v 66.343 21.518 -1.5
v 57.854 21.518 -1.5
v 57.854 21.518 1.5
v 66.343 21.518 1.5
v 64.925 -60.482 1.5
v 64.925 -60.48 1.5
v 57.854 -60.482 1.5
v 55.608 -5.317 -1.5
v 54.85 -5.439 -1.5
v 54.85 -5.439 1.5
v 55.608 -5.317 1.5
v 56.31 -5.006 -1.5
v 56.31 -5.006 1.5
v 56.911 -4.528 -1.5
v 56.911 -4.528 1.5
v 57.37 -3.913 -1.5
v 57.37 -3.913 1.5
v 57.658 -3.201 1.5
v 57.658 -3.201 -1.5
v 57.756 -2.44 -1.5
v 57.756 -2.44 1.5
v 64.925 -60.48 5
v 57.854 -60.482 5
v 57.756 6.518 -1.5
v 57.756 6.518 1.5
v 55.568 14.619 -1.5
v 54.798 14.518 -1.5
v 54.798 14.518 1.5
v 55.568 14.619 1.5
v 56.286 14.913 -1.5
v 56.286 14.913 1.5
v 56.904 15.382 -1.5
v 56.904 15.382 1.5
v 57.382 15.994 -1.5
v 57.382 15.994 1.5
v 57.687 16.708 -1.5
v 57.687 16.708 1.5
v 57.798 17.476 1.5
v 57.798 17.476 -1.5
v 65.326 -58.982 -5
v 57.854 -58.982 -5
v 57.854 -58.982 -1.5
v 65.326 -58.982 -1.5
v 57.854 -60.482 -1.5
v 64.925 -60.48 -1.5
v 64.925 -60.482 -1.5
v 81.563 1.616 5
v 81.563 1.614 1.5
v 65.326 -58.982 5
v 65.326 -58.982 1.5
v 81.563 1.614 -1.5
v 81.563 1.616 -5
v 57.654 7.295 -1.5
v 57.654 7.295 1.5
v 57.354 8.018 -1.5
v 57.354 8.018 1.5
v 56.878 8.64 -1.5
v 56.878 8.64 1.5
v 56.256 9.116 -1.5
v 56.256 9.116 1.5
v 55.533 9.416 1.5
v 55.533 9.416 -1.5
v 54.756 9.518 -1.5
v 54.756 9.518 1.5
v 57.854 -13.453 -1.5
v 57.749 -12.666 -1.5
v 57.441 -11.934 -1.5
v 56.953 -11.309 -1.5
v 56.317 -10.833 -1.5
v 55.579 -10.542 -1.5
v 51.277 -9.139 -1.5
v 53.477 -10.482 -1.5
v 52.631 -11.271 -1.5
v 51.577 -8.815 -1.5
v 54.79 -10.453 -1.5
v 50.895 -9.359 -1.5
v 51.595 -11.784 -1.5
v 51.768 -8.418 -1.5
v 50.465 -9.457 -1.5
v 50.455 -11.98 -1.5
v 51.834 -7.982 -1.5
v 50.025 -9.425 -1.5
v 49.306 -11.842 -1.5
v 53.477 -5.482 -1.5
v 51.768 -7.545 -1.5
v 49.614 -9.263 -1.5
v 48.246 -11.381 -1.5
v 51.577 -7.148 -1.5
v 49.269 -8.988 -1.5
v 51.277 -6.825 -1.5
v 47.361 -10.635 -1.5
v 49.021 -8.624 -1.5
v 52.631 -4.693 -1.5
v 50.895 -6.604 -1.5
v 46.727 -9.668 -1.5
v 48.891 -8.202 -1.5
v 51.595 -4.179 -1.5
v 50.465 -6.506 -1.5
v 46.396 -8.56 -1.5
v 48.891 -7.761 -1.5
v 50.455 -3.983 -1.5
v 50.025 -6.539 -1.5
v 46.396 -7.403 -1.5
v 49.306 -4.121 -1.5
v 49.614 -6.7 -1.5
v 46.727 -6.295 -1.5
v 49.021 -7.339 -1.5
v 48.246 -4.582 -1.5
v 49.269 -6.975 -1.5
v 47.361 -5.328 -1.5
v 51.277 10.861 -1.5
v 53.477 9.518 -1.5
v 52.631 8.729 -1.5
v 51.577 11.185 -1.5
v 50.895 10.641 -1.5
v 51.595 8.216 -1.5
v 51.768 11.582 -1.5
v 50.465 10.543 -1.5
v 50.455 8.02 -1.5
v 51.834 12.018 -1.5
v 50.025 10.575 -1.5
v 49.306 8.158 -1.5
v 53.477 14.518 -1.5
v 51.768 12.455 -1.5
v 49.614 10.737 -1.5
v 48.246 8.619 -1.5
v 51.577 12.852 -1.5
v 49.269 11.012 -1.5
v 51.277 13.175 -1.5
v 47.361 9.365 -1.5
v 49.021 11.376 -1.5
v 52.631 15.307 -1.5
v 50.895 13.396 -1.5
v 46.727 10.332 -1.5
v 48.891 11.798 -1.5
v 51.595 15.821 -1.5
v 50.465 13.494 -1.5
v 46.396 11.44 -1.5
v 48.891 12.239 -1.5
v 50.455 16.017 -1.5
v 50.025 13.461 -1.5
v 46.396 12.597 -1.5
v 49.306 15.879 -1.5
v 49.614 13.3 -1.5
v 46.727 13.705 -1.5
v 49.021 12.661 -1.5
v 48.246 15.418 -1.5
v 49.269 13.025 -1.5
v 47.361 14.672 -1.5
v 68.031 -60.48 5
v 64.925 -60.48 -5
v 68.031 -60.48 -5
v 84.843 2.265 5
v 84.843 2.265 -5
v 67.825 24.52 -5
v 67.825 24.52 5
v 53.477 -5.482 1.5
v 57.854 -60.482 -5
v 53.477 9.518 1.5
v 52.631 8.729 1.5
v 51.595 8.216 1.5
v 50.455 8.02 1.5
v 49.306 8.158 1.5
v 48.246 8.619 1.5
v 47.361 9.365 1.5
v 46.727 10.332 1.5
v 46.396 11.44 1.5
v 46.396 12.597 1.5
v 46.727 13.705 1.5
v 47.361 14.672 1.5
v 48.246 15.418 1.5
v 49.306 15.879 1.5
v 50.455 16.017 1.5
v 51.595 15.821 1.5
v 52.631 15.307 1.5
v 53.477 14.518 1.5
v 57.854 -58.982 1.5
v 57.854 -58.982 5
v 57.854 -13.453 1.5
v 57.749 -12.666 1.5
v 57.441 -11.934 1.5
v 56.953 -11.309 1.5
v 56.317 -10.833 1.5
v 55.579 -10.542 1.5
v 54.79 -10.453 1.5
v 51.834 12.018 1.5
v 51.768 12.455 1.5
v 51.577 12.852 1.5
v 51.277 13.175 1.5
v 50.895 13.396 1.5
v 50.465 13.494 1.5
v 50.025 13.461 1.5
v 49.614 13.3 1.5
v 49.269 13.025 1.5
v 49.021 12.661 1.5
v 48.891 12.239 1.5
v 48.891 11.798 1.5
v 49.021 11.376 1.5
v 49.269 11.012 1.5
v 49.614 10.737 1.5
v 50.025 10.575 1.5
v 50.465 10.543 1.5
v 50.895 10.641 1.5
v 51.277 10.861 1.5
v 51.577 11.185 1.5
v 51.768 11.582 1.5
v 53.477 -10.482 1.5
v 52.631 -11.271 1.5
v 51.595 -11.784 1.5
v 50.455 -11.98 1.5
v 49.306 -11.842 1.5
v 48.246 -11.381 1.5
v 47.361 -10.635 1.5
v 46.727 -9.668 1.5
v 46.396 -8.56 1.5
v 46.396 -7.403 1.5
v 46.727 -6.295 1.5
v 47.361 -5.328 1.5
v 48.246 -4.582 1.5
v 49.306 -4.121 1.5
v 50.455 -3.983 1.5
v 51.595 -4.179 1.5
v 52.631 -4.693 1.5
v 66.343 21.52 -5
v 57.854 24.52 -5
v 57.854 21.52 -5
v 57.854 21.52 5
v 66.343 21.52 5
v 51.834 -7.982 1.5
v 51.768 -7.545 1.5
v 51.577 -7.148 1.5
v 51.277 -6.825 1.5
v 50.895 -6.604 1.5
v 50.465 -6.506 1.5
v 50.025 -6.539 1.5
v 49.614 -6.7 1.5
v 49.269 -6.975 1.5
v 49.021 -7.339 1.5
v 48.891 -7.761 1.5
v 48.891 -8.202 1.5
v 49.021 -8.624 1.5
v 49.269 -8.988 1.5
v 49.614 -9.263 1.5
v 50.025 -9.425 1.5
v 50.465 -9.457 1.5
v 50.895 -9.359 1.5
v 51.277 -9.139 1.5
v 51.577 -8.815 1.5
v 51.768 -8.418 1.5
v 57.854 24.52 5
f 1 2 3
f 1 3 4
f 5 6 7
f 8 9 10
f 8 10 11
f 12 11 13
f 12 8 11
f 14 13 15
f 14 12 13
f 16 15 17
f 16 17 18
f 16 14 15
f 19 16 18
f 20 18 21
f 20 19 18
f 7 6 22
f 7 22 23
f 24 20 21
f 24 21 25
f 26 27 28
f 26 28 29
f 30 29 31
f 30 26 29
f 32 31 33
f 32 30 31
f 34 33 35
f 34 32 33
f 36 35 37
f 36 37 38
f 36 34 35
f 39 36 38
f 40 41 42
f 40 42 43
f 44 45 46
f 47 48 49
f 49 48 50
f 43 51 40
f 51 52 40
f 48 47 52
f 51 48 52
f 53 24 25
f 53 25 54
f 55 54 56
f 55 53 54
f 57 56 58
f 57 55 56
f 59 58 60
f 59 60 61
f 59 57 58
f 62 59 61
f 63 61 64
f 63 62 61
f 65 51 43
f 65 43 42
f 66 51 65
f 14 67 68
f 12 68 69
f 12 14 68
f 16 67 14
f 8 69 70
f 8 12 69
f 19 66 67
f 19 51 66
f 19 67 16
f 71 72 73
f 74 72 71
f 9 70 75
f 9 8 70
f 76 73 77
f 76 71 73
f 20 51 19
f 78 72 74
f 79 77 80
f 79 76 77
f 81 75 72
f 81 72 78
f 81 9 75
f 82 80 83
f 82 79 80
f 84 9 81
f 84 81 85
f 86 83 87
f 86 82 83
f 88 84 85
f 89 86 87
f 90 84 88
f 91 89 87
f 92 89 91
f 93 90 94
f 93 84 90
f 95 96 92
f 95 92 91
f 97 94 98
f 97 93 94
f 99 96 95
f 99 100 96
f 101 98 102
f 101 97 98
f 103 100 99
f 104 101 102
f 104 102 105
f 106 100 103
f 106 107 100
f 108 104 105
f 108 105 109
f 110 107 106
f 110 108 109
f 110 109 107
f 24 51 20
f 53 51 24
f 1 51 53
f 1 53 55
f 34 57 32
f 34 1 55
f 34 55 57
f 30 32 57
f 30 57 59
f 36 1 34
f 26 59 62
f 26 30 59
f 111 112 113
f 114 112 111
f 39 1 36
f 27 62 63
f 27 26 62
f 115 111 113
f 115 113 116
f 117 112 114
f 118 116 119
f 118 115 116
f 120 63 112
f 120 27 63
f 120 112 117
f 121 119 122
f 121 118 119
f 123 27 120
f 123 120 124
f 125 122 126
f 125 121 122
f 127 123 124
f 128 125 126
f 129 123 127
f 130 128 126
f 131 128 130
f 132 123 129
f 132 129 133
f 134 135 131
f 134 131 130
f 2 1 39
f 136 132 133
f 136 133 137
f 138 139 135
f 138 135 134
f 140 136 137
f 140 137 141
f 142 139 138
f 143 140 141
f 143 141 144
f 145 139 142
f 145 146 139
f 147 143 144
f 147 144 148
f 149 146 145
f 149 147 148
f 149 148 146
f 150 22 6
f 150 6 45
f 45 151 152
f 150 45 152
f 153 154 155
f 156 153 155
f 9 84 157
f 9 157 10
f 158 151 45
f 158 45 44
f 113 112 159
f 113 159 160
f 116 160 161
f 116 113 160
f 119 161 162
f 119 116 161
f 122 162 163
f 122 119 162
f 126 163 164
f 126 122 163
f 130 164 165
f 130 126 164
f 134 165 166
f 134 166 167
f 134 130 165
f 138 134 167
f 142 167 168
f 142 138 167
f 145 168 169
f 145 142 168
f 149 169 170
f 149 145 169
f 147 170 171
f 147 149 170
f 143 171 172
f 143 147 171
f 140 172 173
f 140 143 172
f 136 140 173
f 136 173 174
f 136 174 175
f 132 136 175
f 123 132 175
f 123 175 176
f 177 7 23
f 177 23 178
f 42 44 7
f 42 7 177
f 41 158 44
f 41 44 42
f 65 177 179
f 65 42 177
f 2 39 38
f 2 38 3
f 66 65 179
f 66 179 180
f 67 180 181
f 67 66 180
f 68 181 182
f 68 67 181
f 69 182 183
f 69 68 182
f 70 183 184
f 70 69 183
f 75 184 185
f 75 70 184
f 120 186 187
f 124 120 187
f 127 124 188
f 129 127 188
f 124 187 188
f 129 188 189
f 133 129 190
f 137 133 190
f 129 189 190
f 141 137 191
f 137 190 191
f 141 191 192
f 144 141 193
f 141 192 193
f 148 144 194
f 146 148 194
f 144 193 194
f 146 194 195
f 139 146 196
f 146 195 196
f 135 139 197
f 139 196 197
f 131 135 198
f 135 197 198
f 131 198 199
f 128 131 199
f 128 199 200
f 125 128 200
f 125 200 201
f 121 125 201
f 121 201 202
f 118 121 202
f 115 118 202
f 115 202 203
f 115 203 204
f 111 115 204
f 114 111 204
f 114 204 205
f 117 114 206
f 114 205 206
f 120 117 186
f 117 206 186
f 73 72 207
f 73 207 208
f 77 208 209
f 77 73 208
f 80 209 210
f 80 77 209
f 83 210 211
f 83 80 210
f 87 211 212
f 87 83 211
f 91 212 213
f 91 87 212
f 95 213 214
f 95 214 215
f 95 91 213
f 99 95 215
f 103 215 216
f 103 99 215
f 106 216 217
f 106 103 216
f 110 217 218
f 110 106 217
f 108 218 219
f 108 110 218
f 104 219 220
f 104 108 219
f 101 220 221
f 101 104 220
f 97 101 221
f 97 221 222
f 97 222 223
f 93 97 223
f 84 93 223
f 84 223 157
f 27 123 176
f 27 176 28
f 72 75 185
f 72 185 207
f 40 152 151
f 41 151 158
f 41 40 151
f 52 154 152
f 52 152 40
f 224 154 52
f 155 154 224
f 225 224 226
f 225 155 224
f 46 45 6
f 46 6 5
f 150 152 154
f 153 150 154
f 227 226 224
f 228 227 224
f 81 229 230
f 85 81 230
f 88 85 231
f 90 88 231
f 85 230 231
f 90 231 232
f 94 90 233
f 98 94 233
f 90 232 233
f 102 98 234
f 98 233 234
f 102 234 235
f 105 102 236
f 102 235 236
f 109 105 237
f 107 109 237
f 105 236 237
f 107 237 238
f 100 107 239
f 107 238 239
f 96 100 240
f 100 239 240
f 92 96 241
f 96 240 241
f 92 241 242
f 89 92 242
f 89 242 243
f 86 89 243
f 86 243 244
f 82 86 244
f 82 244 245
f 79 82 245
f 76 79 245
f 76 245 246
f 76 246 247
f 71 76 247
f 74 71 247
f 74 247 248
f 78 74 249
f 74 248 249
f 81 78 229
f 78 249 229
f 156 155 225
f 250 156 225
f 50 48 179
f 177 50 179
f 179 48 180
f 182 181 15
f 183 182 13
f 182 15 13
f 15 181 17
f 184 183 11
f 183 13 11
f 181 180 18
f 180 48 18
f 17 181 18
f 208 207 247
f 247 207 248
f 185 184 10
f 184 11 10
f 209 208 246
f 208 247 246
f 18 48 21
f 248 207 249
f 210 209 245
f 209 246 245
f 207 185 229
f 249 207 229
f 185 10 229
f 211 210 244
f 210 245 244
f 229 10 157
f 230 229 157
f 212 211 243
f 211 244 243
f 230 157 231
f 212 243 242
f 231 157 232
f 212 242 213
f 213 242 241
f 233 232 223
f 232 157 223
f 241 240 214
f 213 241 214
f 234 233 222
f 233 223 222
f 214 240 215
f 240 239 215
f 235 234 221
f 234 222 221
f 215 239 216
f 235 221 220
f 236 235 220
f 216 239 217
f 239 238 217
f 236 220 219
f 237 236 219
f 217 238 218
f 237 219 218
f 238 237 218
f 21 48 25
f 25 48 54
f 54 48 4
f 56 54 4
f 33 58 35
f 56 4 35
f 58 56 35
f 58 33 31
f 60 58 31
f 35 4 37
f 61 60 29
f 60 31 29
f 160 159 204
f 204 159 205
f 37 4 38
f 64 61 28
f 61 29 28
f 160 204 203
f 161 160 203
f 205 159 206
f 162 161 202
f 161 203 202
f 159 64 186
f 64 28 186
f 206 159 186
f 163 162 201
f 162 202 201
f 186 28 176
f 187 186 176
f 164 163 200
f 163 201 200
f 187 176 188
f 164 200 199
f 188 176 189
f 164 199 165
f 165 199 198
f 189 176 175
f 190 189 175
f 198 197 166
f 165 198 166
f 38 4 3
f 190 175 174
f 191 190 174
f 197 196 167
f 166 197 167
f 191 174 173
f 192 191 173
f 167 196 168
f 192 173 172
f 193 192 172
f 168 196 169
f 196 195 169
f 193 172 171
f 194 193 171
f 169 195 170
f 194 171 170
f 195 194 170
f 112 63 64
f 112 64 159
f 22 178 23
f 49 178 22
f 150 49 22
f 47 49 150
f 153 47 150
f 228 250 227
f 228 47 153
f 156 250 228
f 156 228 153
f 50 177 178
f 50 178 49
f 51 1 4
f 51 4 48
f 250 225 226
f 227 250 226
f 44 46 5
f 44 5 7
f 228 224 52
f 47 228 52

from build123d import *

# Parameters (mm, degrees)
BOSS_EXTRUDE4_DEPTH      = 5
BOSS_EXTRUDE4_DEPTH_BACK = 5
BOSS_EXTRUDE8_DEPTH      = 1.5
BOSS_EXTRUDE8_DEPTH_BACK = 1.5
BOSS_EXTRUDE9_START      = -6.5
BOSS_EXTRUDE9_DEPTH      = 10
SKETCH7_R                = 1.48
CUT_EXTRUDE4_DEPTH       = 3
SKETCH8_R                = 1.48
CUT_EXTRUDE5_DEPTH       = 3


with BuildPart() as part:
    # Sketch1 → Boss-Extrude4 (new, two sides: drawn at the far end of the back side and taken through both)
    with BuildSketch(Plane.XY.offset(-BOSS_EXTRUDE4_DEPTH_BACK)):
        Polygon((57.854367278, 21.520362054), (66.342730398, 21.520362054), (81.563363175, 1.615876121), (64.92491937, -60.479638348), (68.030747921, -60.479638348), (84.843243231, 2.265445145), (67.825274573, 24.520362054), (57.854367278, 24.520362054), align=None)
    extrude(amount=BOSS_EXTRUDE4_DEPTH + BOSS_EXTRUDE4_DEPTH_BACK)



with BuildPart() as body_2:
    # Sketch4 → Boss-Extrude8 (new, two sides: drawn at the far end of the back side and taken through both)
    with BuildSketch(Plane.XY.offset(-BOSS_EXTRUDE8_DEPTH_BACK)):
        with BuildLine():
            Line((57.854216238, 21.518374124), (66.342579359, 21.518374124))
            Line((66.342579359, 21.518374124), (81.563212135, 1.613888191))
            Line((81.563212135, 1.613888191), (64.92476833, -60.481626279))
            Line((64.92476833, -60.481626279), (57.854216238, -60.481626279))
            Line((57.854216238, -60.481626279), (57.854216238, -13.452758872))
            ThreePointArc((57.854216238, -13.452758872), (56.952658997, -11.308805051), (54.789857581, -10.453449291))
            Line((54.789857581, -10.453449291), (53.476715385, -10.481626465))
            ThreePointArc((53.476715385, -10.481626465), (46.354216528, -7.981626288), (53.476715385, -5.481626111))
            Line((53.476715385, -5.481626111), (54.850195116, -5.438621709))
            ThreePointArc((54.850195116, -5.438621709), (56.910567696, -4.527954069), (57.756309483, -2.440091154))
            Line((57.756309483, -2.440091154), (57.756309483, 6.518373554))
            ThreePointArc((57.756309483, 6.518373554), (56.877629826, 8.639693897), (54.756309483, 9.518373554))
            Line((54.756309483, 9.518373554), (53.476715385, 9.518373554))
            ThreePointArc((53.476715385, 9.518373554), (46.354216528, 12.018373731), (53.476715385, 14.518373908))
            Line((53.476715385, 14.518373908), (54.797976093, 14.518373908))
            ThreePointArc((54.797976093, 14.518373908), (56.904410545, 15.382271406), (57.797682695, 17.476417975))
            Line((57.797682695, 17.476417975), (57.854216238, 21.518374124))
        make_face()
    extrude(amount=BOSS_EXTRUDE8_DEPTH + BOSS_EXTRUDE8_DEPTH_BACK)


with BuildPart() as part_1:
    add(part.part)

    add(body_2.part)  # Boss-Extrude9 merges body 2
    # Sketch6 → Boss-Extrude9 (add)
    with BuildSketch(Plane.XY.offset(1.5).offset(BOSS_EXTRUDE9_START)):
        Polygon((57.854216238, -60.481626279), (57.854216238, -58.981626279), (65.326692139, -58.981626279), (64.92491937, -60.479638348), align=None)
    extrude(amount=BOSS_EXTRUDE9_DEPTH)

    # Sketch7 → Cut-Extrude4 (cut)
    with BuildSketch(Plane.XY.offset(1.5)):
        with Locations((50.354216528, -7.981626288)):
            Circle(SKETCH7_R)
    extrude(amount=-CUT_EXTRUDE4_DEPTH, mode=Mode.SUBTRACT)

    # Sketch8 → Cut-Extrude5 (cut)
    with BuildSketch(Plane.XY.offset(1.5)):
        with Locations((50.354216528, 12.018373731)):
            Circle(SKETCH8_R)
    extrude(amount=-CUT_EXTRUDE5_DEPTH, mode=Mode.SUBTRACT)


solid = part_1.part
